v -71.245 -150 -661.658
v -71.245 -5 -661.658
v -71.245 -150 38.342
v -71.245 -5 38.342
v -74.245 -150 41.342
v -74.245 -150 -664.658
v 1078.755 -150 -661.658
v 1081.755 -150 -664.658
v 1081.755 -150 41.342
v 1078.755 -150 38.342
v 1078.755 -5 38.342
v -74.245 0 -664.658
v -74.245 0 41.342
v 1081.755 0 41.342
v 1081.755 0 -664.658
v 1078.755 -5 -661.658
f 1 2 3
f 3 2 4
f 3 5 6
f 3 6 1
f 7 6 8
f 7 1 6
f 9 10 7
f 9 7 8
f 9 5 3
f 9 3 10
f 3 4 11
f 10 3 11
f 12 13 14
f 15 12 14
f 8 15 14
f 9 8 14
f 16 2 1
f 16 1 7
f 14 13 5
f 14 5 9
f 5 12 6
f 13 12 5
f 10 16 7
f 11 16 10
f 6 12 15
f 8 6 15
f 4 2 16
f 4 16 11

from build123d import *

# Parameters (mm, degrees)
F0_W     = 1156
F0_H     = 706
F0_W_2   = 1150
F0_H_2   = 700
F1_DEPTH = 150
F2_W     = 5
F2_H     = 706
F3_DEPTH = 1153


with BuildPart() as f1:
    # F0 (on Front) → F1 (new body)
    with BuildSketch(Plane.XZ):
        with Locations((503.755269, -311.657544)):
            Rectangle(F0_W, F0_H)
        with Locations((503.755269, -311.657544)):
            Rectangle(F0_W_2, F0_H_2, mode=Mode.SUBTRACT)
    extrude(amount=F1_DEPTH)

    # F2 (on face) → F3 (join, through all)
    with BuildSketch(Plane(origin=(-74.244731, 0, 0), x_dir=(0, -1, 0), z_dir=(-1, 0, 0))):
        with Locations((2.5, -311.657544)):
            Rectangle(F2_W, F2_H)
    extrude(amount=-F3_DEPTH)


solid = f1.part
